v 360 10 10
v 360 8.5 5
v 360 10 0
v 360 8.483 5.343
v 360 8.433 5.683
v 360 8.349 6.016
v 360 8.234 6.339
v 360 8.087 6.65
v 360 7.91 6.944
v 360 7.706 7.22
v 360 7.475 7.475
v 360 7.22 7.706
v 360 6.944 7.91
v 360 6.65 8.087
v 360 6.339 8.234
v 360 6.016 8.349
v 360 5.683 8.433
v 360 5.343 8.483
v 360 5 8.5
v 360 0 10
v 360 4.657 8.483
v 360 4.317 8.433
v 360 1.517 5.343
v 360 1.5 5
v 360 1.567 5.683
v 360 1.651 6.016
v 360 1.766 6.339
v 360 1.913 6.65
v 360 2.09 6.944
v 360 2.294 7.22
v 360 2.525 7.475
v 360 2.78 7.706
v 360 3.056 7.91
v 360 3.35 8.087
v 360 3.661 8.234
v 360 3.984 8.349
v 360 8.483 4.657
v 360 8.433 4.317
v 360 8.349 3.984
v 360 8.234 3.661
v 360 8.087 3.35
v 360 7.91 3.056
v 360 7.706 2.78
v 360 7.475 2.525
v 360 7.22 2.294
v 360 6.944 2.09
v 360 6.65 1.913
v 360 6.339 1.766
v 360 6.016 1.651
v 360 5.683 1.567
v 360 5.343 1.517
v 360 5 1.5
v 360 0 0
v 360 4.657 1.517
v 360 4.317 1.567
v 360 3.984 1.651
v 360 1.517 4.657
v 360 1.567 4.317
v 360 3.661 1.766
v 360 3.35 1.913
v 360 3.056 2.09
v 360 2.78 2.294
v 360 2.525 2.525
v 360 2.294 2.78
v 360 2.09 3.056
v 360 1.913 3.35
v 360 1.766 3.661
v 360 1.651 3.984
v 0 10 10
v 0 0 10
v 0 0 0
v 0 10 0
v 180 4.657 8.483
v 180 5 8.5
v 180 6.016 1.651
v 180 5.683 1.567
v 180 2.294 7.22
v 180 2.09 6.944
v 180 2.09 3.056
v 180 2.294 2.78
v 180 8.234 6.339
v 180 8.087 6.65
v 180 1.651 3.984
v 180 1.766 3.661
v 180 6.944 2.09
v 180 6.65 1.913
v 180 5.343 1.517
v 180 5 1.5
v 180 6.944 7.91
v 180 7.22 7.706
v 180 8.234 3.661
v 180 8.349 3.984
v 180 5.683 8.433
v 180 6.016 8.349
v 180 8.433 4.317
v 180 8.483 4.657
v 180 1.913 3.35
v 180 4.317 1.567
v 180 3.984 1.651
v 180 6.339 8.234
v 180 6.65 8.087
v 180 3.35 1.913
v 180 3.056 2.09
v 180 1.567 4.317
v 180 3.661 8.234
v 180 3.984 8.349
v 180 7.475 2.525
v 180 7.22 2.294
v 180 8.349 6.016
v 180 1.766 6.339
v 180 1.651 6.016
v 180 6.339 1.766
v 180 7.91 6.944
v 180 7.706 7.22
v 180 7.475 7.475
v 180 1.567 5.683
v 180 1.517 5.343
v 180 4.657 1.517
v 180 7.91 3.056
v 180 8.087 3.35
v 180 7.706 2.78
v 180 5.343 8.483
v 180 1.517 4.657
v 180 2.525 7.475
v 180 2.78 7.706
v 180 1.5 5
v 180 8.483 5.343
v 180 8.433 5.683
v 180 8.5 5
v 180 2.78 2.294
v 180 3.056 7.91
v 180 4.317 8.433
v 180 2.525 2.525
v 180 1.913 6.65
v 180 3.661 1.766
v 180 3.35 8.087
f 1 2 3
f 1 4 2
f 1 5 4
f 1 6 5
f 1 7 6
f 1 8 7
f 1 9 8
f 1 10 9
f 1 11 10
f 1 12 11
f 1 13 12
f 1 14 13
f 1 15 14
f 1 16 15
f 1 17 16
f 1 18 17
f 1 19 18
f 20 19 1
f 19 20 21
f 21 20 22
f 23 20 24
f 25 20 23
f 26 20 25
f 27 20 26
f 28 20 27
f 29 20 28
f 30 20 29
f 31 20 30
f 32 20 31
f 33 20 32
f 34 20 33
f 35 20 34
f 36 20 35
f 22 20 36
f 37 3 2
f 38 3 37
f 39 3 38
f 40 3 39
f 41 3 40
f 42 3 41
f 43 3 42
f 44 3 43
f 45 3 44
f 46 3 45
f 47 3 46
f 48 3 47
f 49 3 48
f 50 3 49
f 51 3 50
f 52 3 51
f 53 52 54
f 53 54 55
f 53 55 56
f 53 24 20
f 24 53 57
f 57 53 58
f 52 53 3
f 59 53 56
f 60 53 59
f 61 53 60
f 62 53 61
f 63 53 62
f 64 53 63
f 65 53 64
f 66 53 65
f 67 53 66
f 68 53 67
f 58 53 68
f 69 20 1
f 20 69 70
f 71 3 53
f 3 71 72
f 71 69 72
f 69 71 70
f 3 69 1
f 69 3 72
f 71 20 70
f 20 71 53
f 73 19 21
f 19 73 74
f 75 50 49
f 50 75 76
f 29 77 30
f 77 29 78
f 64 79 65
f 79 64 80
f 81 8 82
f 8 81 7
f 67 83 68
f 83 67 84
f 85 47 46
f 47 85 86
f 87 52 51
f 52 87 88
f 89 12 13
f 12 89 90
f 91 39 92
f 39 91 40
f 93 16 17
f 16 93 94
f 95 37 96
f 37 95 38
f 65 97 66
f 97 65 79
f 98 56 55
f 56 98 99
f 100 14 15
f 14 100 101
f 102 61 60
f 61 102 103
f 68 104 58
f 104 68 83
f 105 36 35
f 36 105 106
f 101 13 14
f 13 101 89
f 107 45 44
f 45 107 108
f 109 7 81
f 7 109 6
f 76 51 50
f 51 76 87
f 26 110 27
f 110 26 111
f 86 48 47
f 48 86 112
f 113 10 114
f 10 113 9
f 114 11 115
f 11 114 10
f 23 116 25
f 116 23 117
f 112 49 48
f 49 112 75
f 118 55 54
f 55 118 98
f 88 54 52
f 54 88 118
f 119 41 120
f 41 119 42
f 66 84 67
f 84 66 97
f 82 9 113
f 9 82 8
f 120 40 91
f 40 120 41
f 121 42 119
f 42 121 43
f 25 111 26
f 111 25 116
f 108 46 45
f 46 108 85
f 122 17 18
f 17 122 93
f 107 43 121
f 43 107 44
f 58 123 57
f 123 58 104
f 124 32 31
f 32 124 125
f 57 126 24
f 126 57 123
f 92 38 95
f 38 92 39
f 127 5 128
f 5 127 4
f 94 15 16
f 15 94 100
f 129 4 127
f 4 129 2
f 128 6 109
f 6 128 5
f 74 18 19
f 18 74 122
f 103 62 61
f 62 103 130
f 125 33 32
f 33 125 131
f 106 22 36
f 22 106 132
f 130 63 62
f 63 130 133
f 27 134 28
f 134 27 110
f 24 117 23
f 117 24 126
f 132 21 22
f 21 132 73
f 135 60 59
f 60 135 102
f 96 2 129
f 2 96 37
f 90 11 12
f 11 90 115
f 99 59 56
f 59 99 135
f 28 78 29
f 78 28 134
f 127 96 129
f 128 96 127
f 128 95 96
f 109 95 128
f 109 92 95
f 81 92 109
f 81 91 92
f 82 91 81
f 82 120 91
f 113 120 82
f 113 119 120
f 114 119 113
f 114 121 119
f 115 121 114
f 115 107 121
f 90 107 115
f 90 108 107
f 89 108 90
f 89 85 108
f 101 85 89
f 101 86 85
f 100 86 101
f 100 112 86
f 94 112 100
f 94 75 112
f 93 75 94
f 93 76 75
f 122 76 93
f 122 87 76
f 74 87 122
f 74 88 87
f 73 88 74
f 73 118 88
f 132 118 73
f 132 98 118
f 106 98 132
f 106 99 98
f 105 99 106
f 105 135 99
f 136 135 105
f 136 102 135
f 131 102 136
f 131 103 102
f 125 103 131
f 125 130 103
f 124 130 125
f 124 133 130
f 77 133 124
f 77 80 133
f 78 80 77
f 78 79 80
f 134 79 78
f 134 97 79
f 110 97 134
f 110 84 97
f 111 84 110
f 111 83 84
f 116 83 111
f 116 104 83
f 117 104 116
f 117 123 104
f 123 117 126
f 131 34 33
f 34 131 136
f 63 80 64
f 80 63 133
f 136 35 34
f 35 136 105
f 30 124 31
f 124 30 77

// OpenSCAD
// column_half.scad
// A single corner vertical segment, printed lying flat
// Model coordinates: X=length (360), Y=thickness (10), Z=thickness (10)
// The part sits on Z=0 (no height below Z=0). Hole runs along X-axis centered in Y/Z.

length = 360;
thk = 10;
hole_d = 7; // clearance for M6
$fn = 64;

module column_segment(len=length, t=thk, hd=hole_d) {
    difference() {
        // block
        translate([0,0,0]) cube([len, t, t]);
        // hole along X (rotate cylinder to X-axis)
        translate([len/2, t/2, t/2]) rotate([0,90,0]) cylinder(r=hd/2, h=len + 20, $fn=$fn);
    }
}

column_segment();
